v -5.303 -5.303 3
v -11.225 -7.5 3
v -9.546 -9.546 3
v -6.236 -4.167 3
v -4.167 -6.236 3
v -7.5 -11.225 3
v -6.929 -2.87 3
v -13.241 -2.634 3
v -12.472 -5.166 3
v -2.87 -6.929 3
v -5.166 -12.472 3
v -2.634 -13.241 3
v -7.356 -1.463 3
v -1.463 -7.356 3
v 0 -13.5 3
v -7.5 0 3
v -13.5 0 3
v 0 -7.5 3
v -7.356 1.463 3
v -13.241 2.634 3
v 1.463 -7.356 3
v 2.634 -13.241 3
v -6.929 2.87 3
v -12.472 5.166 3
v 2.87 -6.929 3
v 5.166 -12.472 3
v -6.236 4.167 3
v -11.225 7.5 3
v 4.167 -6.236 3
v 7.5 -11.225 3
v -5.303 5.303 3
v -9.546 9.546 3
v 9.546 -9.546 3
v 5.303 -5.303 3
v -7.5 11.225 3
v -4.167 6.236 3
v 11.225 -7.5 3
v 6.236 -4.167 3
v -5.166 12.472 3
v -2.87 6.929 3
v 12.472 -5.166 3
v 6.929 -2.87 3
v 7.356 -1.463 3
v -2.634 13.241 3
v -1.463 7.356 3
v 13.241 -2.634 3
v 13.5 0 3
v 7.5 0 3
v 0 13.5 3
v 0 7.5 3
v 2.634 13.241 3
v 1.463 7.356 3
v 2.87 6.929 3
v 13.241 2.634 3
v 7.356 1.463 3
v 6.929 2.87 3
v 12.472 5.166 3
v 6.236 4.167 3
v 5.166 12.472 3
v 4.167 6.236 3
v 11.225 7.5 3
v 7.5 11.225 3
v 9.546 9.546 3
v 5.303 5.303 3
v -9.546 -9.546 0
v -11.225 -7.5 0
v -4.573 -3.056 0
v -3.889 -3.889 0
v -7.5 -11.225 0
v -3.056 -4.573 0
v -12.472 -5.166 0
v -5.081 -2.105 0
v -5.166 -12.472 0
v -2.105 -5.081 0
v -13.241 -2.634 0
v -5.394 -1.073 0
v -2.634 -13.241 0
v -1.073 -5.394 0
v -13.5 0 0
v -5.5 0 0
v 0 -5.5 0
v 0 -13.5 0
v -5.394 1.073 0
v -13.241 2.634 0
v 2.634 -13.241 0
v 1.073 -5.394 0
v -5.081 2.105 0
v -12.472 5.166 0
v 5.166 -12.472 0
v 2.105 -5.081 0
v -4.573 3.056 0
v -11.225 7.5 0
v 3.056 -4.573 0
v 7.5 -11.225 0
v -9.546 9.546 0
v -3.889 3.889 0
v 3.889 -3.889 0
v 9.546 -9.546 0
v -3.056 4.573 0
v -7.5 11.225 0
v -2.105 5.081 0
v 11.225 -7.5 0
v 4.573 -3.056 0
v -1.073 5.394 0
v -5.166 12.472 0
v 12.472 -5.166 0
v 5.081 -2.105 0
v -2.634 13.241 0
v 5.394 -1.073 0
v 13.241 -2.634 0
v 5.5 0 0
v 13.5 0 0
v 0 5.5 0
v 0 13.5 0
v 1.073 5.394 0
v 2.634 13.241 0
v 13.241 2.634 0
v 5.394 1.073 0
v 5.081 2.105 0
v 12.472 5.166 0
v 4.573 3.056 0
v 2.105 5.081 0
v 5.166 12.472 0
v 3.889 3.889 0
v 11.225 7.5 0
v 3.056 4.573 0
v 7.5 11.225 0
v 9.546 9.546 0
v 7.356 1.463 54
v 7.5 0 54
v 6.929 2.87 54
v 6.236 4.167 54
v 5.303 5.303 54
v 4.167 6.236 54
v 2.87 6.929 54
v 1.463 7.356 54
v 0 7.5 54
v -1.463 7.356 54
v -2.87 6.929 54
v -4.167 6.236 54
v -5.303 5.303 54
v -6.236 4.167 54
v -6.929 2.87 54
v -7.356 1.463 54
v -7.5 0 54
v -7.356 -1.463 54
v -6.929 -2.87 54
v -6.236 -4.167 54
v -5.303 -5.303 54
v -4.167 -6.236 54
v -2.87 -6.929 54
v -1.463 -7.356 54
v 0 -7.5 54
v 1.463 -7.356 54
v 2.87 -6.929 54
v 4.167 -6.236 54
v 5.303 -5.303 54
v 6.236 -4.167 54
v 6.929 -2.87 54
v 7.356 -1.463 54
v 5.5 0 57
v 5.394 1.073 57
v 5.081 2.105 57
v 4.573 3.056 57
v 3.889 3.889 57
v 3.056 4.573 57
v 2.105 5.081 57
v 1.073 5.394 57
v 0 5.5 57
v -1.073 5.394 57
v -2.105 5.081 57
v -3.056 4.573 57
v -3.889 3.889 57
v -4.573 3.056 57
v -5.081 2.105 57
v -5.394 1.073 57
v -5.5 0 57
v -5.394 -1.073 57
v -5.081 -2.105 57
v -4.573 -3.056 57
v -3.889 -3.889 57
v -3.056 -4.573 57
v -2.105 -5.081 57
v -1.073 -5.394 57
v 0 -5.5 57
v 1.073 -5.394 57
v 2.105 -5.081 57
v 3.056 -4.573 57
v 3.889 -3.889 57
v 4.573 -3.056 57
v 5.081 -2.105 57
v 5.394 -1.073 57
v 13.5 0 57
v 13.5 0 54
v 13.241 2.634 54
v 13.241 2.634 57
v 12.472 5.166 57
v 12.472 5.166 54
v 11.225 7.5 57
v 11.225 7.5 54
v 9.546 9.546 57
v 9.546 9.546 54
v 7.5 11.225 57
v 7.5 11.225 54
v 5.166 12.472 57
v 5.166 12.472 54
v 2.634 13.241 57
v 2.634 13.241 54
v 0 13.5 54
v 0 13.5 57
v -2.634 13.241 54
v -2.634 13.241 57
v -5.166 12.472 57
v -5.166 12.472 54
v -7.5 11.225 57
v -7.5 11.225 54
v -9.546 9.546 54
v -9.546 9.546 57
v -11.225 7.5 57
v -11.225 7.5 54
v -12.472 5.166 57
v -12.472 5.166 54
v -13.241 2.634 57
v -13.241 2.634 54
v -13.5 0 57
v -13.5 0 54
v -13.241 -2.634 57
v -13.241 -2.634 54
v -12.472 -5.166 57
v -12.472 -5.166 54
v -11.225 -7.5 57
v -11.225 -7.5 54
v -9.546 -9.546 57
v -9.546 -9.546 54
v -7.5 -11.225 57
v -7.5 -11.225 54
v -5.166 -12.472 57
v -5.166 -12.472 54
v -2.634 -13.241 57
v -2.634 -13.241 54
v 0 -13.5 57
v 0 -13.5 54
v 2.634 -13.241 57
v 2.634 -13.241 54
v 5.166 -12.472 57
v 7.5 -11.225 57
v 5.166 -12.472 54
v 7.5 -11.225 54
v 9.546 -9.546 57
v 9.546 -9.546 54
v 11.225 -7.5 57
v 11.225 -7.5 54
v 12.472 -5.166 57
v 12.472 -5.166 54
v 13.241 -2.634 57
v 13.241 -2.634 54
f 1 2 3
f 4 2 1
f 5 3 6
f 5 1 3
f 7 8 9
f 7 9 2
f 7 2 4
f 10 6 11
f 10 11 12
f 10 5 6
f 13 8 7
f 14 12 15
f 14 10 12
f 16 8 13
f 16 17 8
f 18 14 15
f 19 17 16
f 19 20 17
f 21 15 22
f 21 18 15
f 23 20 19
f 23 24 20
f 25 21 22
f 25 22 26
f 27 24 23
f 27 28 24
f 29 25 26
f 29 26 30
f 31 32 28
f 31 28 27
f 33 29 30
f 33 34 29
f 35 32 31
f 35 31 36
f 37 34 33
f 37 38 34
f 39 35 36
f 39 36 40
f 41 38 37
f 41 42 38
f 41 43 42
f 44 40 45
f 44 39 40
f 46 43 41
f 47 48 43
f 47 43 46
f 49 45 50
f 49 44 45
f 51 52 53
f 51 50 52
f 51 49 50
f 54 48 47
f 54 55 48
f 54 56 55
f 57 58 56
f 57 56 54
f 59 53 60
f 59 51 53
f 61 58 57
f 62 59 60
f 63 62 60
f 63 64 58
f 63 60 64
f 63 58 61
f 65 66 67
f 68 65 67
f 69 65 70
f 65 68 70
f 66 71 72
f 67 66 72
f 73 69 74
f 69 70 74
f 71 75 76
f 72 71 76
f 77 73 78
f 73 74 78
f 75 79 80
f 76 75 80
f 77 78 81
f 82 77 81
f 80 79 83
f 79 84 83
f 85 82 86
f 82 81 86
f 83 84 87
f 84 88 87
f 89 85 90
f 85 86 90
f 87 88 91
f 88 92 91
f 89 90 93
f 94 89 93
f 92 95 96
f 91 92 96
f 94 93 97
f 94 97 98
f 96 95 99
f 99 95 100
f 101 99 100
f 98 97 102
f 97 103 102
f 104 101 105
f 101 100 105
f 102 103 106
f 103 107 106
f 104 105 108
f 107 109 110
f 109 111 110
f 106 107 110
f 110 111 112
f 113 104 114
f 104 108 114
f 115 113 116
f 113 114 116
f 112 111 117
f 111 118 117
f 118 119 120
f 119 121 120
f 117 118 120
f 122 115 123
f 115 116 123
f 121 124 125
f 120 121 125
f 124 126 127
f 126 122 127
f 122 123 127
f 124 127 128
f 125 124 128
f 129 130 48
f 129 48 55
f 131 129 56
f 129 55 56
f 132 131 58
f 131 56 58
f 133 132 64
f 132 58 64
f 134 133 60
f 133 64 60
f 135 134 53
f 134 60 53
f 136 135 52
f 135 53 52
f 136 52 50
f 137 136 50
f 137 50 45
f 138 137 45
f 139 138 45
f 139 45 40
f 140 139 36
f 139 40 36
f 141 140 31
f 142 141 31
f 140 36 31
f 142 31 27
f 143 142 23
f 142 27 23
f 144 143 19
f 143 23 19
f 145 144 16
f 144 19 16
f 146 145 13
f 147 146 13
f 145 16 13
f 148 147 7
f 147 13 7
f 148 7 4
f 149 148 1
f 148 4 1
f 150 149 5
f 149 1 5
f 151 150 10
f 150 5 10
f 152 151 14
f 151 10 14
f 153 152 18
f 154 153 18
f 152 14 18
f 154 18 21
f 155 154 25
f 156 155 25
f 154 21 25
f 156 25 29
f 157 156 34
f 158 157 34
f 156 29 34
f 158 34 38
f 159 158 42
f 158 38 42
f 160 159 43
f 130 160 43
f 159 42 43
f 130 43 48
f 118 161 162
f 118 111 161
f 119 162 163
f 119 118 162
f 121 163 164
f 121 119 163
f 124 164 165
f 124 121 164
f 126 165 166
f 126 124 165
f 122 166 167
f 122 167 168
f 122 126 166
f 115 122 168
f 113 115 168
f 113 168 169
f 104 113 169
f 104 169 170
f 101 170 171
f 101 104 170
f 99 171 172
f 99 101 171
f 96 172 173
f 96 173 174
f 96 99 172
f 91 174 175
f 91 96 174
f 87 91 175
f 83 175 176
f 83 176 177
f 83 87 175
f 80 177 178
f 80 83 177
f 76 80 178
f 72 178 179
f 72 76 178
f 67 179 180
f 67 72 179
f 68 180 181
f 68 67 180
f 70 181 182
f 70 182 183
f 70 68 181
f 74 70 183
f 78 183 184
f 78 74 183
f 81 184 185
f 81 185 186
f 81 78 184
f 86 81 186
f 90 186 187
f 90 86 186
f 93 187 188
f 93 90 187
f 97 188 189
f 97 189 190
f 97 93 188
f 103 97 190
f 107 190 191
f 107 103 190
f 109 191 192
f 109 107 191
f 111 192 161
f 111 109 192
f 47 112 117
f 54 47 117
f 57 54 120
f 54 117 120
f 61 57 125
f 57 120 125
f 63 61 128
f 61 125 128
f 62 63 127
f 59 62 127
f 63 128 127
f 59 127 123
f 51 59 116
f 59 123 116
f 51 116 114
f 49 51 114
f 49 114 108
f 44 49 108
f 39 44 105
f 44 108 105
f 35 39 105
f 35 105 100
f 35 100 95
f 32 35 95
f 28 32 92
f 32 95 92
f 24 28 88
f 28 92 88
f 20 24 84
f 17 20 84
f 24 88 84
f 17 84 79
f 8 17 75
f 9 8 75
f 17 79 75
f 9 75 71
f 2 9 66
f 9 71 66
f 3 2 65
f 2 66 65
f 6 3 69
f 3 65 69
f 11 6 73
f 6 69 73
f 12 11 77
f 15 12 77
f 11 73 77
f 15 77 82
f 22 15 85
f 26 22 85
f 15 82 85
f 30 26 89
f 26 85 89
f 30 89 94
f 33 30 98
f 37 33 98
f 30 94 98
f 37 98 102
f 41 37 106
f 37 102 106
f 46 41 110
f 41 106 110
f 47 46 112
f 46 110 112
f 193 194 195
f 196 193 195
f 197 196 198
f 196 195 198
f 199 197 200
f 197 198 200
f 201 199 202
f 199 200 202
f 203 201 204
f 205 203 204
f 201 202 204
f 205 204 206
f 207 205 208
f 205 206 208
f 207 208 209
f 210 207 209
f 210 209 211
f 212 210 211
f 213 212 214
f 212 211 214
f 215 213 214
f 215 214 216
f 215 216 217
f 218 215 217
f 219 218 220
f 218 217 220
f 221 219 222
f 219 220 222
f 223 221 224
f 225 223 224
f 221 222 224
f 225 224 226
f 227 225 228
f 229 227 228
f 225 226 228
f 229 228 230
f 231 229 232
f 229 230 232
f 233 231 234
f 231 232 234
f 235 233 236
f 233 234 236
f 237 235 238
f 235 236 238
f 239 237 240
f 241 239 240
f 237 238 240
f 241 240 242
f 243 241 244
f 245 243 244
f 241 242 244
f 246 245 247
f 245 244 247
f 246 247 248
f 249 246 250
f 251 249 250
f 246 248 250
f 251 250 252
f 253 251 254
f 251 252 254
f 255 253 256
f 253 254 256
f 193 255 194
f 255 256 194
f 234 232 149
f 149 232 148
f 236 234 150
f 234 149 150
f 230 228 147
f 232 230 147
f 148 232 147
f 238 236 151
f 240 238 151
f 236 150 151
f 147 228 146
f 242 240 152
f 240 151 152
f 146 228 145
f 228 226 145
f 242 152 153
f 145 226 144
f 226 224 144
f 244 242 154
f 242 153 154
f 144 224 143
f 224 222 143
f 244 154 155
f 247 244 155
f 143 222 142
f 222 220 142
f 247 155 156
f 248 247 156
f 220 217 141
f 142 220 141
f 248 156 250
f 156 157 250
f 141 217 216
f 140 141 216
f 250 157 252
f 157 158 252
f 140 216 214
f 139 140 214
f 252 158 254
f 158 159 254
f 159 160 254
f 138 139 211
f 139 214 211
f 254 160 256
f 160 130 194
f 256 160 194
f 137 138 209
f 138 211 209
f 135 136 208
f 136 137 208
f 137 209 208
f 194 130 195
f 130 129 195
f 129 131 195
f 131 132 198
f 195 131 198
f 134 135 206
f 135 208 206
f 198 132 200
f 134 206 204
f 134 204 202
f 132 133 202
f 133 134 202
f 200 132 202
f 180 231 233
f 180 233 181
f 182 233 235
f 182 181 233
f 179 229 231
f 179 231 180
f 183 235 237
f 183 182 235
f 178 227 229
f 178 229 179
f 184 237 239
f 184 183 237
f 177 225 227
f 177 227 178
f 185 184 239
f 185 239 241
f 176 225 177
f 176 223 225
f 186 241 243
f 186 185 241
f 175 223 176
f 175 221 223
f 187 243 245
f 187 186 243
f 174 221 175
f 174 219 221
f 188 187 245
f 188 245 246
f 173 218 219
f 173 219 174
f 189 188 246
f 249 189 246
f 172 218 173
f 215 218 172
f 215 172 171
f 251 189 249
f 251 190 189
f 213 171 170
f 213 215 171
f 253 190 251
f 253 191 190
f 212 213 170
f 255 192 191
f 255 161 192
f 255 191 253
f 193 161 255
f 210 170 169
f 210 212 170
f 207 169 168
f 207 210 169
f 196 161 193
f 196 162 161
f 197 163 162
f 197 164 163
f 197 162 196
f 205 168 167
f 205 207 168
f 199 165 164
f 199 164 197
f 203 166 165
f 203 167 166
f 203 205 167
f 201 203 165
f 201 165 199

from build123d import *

# Parameters (mm, degrees)
ESBO_O1_R                = 13.5
ESBO_O1_R_2              = 5.5
RESSALTO_EXTRUS_O1_DEPTH = 3
ESBO_O2_R                = 7.5
ESBO_O2_R_2              = 5.5
RESSALTO_EXTRUS_O2_DEPTH = 51
ESBO_O3_R                = 13.5
ESBO_O3_R_2              = 5.5
RESSALTO_EXTRUS_O3_DEPTH = 3


with BuildPart() as part:
    # Esboço1 → Ressalto-extrusão1 (new body)
    with BuildSketch(Plane.XY):
        Circle(ESBO_O1_R)
        Circle(ESBO_O1_R_2, mode=Mode.SUBTRACT)
    extrude(amount=RESSALTO_EXTRUS_O1_DEPTH)

    # Esboço2 → Ressalto-extrusão2 (add)
    with BuildSketch(Plane.XY.offset(3)):
        Circle(ESBO_O2_R)
        Circle(ESBO_O2_R_2, mode=Mode.SUBTRACT)
    extrude(amount=RESSALTO_EXTRUS_O2_DEPTH)

    # Esboço3 → Ressalto-extrusão3 (add)
    with BuildSketch(Plane.XY.offset(54)):
        Circle(ESBO_O3_R)
        Circle(ESBO_O3_R_2, mode=Mode.SUBTRACT)
    extrude(amount=RESSALTO_EXTRUS_O3_DEPTH)


solid = part.part
